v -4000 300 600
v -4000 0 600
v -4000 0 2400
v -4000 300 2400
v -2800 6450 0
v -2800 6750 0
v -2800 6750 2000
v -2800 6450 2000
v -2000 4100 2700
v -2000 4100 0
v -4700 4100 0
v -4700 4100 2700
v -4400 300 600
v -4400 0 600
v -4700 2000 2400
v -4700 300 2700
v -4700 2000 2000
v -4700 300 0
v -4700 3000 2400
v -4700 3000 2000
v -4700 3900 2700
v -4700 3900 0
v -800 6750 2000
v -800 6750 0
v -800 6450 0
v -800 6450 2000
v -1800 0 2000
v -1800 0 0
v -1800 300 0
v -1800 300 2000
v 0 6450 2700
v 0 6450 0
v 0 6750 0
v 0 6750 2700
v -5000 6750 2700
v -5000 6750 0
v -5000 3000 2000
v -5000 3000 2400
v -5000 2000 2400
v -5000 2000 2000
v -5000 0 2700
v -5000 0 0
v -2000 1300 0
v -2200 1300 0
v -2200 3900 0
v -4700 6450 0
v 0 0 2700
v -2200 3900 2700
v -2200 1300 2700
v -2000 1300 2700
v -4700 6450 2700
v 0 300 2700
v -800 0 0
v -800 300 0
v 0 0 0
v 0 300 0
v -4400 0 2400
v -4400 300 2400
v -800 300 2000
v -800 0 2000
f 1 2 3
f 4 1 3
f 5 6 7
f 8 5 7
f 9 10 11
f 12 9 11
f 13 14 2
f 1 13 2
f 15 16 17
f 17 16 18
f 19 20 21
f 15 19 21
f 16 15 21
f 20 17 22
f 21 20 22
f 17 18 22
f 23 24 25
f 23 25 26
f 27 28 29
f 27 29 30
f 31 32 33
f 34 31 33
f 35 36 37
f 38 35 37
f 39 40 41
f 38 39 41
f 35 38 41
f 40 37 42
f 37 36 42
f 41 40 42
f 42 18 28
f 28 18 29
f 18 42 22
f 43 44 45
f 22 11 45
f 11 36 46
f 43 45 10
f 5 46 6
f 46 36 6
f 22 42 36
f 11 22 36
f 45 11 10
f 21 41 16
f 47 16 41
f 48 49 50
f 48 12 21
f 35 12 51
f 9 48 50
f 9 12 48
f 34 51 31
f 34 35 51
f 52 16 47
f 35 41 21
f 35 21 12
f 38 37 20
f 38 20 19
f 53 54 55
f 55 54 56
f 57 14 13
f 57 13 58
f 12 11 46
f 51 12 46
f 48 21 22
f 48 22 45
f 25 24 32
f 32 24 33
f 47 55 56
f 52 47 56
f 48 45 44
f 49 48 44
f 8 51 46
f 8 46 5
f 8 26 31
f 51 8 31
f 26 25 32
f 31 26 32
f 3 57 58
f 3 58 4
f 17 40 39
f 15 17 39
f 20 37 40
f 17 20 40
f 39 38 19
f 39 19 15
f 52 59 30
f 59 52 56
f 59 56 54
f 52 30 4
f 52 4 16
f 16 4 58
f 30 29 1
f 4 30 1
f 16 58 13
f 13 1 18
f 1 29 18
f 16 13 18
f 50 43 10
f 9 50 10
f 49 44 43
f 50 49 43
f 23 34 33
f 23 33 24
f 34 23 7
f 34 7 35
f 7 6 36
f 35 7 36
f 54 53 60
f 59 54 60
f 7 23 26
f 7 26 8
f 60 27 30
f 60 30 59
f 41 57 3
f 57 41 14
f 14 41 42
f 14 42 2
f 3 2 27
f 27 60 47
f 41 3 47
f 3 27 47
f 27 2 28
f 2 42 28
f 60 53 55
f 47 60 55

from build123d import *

# Parameters (mm, degrees)
F1_DEPTH = 2700
F2_W     = 1000
F2_H     = 2000
F3_DEPTH = 400
F2_W_2   = 400
F2_H_2   = 1800
F4_DEPTH = 400
F5_W     = 2000
F5_H     = 2000
F6_DEPTH = 400
F7_DEPTH = 2700
F8_W     = 1000
F8_H     = 400
F9_DEPTH = 400


with BuildPart() as f1:
    # F0 (on Top) → F1 (new body)
    with BuildSketch(Plane.XY):
        Polygon((-5000, 0), (0, 0), (0, 300), (-4700, 300), (-4700, 1300), (-4700, 3900), (-4700, 4100), (-4700, 6450), (0, 6450), (0, 6750), (-5000, 6750), align=None)
    extrude(amount=F1_DEPTH)

    # F2 (on face) → F3 (cut)
    with BuildSketch(Plane.XZ):
        with Locations((-1300, 1000)):
            Rectangle(F2_W, F2_H)
    extrude(amount=-F3_DEPTH, mode=Mode.SUBTRACT)

    # F2 (on face) → F4 (cut)
    with BuildSketch(Plane.XZ):
        with Locations((-4200, 1500)):
            Rectangle(F2_W_2, F2_H_2)
    extrude(amount=-F4_DEPTH, mode=Mode.SUBTRACT)

    # F5 (on face) → F6 (cut)
    with BuildSketch(Plane(origin=(0, 6750, 0), x_dir=(-1, 0, 0), z_dir=(0, 1, 0))):
        with Locations((1800, 1000)):
            Rectangle(F5_W, F5_H)
    extrude(amount=-F6_DEPTH, mode=Mode.SUBTRACT)

    # F0 (on Top) → F7 (join)
    with BuildSketch(Plane.XY):
        Polygon((-2000, 4100), (-4700, 4100), (-4700, 3900), (-2200, 3900), (-2200, 1300), (-2000, 1300), align=None)
    extrude(amount=F7_DEPTH)

    # F8 (on face) → F9 (cut)
    with BuildSketch(Plane(origin=(-5000, 0, 0), x_dir=(0, -1, 0), z_dir=(-1, 0, 0))):
        with Locations((-2500, 2200)):
            Rectangle(F8_W, F8_H)
    extrude(amount=-F9_DEPTH, mode=Mode.SUBTRACT)


solid = f1.part
